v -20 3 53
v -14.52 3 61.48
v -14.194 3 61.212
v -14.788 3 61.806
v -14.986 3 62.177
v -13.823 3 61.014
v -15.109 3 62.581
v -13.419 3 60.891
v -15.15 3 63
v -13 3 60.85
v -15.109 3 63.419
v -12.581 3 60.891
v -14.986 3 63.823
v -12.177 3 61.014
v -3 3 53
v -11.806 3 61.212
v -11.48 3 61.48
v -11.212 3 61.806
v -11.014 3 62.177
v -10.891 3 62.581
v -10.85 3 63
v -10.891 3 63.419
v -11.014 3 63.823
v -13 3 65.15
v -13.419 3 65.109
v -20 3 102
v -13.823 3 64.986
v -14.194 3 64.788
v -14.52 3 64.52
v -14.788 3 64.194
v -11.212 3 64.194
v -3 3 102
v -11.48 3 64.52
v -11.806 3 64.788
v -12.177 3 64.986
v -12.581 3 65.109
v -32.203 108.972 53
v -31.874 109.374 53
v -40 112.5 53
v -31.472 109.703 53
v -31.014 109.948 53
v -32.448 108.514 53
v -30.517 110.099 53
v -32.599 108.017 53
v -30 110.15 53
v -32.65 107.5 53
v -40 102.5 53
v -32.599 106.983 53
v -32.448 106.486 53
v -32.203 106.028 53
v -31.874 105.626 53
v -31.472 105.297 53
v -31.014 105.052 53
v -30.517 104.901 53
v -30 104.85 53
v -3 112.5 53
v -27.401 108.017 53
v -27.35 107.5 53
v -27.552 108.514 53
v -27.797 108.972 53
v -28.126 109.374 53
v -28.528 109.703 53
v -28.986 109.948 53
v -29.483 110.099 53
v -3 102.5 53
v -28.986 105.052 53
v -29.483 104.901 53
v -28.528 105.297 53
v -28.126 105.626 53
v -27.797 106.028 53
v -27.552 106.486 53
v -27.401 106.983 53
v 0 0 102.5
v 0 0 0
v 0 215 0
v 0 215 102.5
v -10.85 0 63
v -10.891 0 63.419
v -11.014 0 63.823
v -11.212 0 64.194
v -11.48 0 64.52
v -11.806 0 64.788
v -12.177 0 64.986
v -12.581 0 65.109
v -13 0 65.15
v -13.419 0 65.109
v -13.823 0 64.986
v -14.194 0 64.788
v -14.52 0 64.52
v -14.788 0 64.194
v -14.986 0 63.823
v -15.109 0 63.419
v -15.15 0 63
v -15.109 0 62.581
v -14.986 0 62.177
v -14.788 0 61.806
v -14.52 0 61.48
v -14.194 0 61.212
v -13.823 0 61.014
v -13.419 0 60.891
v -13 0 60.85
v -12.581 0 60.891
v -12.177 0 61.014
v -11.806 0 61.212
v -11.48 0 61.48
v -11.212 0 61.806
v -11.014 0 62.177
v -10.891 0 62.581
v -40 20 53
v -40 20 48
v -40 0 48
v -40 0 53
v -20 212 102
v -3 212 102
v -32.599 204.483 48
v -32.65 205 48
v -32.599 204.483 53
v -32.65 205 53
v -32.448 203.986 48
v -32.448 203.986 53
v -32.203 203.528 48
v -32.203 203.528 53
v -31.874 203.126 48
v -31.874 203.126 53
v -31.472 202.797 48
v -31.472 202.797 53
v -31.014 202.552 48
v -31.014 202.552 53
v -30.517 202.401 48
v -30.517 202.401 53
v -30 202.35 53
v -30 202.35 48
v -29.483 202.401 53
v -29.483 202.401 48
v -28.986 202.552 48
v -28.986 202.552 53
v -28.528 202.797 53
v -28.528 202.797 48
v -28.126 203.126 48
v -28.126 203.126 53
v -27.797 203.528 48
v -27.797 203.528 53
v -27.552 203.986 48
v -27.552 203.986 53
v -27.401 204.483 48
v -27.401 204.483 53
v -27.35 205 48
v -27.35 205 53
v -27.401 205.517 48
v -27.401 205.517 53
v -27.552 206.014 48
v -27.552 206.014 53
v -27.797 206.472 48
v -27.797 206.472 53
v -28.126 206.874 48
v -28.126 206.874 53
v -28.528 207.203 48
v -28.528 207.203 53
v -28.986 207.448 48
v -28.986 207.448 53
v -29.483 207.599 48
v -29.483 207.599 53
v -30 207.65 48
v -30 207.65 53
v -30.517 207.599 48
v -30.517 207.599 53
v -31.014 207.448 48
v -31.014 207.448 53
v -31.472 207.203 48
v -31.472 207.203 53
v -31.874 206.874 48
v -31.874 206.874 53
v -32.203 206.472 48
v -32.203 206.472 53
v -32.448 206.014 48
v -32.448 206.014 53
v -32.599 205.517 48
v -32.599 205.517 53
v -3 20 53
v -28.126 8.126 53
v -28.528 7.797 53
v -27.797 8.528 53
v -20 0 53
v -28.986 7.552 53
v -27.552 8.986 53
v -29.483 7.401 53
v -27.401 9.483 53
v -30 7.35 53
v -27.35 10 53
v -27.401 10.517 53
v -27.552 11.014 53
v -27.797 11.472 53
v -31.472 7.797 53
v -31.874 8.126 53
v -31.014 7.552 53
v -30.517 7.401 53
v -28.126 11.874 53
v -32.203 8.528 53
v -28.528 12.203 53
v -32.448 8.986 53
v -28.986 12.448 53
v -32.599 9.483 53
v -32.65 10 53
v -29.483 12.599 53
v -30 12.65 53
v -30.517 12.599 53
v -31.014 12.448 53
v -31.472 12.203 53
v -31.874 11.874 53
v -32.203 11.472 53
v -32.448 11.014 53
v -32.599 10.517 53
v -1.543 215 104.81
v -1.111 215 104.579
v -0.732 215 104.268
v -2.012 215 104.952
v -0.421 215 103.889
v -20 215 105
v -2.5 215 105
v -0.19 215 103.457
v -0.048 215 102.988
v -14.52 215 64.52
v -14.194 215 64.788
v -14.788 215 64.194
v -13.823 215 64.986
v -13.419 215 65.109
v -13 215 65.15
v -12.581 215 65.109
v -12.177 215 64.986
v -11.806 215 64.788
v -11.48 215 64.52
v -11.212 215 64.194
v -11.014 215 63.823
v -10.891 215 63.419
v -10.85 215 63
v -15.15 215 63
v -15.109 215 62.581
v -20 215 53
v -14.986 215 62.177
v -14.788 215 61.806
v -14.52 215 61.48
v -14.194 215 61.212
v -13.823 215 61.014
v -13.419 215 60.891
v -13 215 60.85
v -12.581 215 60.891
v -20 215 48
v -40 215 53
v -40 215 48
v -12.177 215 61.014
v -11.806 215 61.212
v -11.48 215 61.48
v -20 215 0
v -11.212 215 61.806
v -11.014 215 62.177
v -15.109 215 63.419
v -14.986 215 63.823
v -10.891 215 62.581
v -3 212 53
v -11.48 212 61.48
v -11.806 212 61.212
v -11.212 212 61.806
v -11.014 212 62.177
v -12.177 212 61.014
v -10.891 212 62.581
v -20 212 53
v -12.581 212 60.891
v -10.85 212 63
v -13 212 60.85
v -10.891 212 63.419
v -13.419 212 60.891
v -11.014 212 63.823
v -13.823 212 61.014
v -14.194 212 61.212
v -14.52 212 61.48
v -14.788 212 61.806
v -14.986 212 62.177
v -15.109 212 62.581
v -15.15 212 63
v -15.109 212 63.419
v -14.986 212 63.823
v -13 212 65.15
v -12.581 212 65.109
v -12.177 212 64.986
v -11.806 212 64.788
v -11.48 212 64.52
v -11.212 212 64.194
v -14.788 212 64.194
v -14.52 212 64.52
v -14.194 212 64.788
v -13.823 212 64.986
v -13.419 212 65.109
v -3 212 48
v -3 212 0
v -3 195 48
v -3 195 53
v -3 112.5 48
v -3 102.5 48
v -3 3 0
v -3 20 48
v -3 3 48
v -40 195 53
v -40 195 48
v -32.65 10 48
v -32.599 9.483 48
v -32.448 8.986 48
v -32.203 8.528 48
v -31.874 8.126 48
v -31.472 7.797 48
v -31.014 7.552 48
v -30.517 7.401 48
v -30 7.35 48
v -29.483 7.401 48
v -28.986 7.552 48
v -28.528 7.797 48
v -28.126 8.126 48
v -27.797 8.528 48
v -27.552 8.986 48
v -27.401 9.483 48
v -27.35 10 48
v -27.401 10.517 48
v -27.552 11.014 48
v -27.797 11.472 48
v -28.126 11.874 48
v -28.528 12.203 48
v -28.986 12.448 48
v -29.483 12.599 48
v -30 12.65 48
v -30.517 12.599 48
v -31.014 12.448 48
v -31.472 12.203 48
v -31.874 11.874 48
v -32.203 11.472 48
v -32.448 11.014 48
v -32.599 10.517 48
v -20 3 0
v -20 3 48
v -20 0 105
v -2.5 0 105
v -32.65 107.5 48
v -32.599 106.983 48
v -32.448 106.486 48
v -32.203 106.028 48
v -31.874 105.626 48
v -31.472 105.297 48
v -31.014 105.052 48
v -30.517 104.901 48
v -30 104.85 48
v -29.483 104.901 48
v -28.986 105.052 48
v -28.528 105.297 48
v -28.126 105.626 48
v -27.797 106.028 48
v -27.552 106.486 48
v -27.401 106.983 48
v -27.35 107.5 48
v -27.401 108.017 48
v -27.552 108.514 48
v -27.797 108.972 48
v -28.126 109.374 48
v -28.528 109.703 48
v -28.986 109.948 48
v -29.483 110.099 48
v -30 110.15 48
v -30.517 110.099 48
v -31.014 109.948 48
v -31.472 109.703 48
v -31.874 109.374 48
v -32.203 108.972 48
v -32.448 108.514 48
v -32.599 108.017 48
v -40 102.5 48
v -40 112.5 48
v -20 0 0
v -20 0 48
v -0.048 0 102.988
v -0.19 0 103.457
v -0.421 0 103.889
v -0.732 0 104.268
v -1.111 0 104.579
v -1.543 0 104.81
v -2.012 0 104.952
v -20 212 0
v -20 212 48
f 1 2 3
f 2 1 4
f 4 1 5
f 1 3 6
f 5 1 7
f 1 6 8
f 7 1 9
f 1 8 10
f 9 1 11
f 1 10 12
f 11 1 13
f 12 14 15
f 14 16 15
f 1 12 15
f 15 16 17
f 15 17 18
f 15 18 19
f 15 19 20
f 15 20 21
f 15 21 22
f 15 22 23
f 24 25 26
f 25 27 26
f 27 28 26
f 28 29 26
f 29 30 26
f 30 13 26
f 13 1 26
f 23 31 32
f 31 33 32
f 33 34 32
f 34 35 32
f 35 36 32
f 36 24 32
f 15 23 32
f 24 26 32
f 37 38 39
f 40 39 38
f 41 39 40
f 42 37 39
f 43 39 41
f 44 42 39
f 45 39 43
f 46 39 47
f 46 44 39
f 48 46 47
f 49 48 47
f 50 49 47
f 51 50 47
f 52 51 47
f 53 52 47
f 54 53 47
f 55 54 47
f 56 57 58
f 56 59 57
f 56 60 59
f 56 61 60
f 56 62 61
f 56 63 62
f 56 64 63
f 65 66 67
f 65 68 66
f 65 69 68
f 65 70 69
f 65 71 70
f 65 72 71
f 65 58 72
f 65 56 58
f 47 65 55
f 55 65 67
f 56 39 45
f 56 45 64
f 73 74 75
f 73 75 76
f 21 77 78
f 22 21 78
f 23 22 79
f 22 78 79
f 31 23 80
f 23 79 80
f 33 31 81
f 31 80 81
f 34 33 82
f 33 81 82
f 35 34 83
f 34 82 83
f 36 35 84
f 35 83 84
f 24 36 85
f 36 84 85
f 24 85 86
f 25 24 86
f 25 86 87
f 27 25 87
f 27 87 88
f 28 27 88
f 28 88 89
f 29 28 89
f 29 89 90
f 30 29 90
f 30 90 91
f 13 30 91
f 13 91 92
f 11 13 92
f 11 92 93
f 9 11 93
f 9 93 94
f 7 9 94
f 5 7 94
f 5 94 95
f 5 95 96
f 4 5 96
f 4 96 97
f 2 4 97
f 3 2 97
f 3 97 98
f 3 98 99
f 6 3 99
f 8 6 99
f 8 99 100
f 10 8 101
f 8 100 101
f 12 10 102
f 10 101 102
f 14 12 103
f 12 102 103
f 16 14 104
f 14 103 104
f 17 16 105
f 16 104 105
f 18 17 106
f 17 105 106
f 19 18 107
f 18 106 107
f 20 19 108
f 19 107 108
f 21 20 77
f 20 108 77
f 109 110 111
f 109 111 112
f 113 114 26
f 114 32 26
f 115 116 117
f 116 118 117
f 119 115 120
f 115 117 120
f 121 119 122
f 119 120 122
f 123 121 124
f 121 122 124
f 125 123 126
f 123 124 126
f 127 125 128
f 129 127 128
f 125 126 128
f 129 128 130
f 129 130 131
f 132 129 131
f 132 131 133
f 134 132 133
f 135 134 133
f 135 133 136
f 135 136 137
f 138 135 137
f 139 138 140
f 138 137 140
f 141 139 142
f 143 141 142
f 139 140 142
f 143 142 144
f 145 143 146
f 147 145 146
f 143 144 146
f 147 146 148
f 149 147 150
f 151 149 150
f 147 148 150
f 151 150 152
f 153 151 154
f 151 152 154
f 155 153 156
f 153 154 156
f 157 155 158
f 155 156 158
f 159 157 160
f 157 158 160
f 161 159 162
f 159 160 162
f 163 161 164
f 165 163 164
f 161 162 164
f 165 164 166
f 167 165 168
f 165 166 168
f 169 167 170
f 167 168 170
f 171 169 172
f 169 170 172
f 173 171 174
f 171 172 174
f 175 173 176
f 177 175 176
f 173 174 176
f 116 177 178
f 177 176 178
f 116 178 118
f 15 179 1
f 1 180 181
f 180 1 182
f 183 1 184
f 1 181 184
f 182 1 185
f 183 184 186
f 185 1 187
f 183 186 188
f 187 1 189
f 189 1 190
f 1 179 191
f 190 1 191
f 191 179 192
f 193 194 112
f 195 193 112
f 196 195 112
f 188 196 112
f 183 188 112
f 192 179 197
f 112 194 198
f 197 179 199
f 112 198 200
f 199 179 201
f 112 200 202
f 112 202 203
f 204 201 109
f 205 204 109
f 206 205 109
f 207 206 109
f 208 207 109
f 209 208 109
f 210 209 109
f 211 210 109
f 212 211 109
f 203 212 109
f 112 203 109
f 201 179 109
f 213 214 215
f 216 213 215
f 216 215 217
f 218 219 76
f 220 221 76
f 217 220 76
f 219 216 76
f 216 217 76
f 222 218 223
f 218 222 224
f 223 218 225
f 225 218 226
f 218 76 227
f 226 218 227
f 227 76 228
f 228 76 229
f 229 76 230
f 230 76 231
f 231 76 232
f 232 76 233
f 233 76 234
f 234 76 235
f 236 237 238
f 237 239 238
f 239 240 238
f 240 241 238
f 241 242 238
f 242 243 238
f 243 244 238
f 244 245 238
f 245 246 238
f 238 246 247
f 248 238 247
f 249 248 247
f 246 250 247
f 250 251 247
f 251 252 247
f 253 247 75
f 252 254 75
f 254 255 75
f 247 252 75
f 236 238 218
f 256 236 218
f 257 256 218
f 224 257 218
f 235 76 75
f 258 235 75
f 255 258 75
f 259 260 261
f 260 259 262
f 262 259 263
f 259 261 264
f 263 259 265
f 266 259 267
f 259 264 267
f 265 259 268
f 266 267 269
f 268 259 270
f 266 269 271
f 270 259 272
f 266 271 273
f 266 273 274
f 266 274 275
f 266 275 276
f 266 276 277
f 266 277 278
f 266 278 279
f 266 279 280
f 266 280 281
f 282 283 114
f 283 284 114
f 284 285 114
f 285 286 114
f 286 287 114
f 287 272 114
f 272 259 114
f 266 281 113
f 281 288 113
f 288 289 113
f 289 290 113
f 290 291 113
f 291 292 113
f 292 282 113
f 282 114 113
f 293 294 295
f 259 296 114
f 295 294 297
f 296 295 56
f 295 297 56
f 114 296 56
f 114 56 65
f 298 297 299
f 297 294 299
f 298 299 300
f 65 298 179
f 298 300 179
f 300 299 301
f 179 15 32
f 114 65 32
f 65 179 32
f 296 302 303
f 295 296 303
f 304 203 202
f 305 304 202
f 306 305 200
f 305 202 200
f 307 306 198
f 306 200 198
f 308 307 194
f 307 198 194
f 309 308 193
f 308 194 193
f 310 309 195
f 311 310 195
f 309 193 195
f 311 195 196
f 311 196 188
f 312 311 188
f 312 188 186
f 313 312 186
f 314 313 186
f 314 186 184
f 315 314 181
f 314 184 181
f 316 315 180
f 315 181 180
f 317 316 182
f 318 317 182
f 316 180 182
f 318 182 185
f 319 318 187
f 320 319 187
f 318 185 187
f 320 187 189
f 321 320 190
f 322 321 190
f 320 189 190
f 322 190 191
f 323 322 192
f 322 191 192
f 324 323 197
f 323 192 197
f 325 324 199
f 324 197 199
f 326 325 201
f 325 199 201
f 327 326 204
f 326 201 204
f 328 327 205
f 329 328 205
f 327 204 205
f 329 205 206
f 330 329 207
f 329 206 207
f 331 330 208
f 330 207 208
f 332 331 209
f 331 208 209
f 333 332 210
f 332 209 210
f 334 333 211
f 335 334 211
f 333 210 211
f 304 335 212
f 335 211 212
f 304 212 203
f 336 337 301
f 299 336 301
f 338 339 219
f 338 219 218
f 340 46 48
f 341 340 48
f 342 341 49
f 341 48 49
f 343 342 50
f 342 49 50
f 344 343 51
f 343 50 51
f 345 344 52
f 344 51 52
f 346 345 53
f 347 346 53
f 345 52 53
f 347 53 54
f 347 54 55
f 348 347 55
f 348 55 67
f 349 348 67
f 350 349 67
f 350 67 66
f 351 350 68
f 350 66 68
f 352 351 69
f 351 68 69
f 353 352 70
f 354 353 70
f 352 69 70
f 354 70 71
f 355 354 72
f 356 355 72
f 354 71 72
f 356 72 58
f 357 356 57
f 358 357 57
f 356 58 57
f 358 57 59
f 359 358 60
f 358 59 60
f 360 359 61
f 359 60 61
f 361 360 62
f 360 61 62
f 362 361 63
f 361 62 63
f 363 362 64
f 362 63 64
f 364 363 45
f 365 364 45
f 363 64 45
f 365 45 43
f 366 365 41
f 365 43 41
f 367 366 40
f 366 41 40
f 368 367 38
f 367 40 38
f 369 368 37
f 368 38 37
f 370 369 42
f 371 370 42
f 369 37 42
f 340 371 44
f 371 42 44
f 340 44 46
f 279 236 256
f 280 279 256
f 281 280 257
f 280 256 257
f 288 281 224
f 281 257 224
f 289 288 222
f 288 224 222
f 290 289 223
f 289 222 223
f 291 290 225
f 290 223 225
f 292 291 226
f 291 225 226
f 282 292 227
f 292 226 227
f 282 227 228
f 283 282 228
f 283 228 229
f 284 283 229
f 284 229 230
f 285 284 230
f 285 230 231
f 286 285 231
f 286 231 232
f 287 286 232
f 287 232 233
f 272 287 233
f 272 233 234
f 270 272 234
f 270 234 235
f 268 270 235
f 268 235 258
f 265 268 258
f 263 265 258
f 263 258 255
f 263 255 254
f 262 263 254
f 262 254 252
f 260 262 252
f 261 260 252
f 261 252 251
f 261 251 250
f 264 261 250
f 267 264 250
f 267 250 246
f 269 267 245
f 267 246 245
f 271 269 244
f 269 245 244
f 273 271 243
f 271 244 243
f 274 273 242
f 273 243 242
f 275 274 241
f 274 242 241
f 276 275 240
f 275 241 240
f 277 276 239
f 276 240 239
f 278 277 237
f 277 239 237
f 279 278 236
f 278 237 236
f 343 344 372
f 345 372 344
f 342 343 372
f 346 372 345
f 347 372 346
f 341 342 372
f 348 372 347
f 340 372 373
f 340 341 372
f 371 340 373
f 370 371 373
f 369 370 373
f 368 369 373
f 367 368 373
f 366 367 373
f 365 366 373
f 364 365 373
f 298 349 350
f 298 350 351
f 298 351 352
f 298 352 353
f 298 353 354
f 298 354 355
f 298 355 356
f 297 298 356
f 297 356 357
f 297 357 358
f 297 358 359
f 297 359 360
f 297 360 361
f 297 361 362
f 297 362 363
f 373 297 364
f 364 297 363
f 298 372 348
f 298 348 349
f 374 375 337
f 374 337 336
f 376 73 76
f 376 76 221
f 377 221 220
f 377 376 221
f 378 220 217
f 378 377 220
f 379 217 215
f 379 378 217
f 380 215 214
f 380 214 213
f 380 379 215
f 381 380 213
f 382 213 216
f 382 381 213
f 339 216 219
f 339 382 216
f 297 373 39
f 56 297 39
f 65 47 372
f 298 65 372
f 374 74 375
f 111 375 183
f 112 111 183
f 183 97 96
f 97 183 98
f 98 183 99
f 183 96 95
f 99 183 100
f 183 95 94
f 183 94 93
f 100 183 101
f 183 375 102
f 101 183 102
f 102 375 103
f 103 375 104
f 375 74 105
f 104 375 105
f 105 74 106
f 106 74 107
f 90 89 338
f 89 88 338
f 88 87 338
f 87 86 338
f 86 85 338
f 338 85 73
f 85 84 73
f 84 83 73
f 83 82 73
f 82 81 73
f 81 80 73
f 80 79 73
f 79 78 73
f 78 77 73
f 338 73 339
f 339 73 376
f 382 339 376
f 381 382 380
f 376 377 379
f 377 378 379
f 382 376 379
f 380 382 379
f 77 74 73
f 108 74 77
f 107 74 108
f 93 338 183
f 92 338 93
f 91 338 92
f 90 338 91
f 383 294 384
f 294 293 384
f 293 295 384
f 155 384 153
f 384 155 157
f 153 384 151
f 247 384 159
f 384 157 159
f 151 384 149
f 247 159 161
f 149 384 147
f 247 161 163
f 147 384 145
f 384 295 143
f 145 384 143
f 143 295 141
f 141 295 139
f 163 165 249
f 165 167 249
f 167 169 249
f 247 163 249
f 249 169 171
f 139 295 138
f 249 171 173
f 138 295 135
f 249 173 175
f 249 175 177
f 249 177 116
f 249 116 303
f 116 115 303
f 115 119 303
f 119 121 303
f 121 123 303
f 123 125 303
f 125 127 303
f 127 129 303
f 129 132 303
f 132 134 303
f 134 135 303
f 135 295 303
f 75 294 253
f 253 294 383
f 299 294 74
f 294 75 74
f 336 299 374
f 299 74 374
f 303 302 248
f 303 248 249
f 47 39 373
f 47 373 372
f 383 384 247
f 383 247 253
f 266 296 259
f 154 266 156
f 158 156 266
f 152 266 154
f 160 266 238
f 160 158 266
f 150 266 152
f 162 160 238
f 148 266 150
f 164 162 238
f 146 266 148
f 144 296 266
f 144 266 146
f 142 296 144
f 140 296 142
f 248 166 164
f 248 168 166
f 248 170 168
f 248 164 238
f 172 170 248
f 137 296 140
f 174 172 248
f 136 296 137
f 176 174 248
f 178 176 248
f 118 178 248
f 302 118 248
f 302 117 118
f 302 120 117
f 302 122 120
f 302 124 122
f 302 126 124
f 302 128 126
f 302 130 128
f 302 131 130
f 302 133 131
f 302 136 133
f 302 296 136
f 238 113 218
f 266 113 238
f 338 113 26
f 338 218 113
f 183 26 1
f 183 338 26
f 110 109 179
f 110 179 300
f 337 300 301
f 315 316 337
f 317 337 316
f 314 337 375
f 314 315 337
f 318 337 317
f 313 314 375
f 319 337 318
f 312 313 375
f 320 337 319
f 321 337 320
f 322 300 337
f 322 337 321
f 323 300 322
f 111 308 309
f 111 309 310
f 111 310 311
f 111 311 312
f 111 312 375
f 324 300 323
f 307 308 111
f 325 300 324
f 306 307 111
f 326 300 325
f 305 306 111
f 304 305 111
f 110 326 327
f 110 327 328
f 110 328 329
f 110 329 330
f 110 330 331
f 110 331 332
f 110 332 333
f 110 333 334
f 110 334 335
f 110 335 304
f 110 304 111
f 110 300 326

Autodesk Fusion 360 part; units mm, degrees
sketch "스케치1" plane through (0, 0, 0) normal (0, 1, 0) x (1, 0, 0)
  line L0 (0, 0) -> (0, -105)
  line L1 (0, 0) -> (-3, 0)
  line L2 (-3, 0) -> (-3, -102)
  line L3 (-3, -102) -> (-20, -102)
  line L4 (0, -105) -> (-20, -105)
  line L5 (-20, -105) -> (-20, -102)
  dimension "d1" = 105
  dimension "d2" = 3
  dimension "d3" = 102
  dimension "d4" = 17
extrude "돌출1" add sketch "스케치1" along normal blind 215
sketch "스케치2" plane through (0, 0, 0) normal (0, -1, 0) x (1, 0, 0)
  line L0 (-3, 0) -> (0, 0)
  line L1 (0, 0) -> (0, 105)
  line L2 (0, 105) -> (-20, 105)
  line L3 (-20, 105) -> (-20, 102)
  line L4 (-20, 102) -> (-3, 102)
  line L5 (-3, 102) -> (-3, 0)
  line L6 (0, 105) -> (-20, 105)
  line L7 (-20, 105) -> (-20, 0)
  line L8 (-20, 0) -> (0, 0)
  line L9 (0, 0) -> (0, 105)
  line L10 (-3, 102) -> (-3, 73)
  line L11 (-3, 73) -> (-20, 73)
  line L12 (-20, 73) -> (-20, 53)
  line L13 (-20, 53) -> (-3, 53)
  line L14 (-3, 53) -> (-3, 73)
  line L15 (-20, 53) -> (-13, 53)
  line L16 (-13, 53) -> (-13, 63)
  line L17 (-13, 63) -> (-20, 63)
  line L18 (-20, 63) -> (-20, 53)
  circle A0 centre (-13, 63) radius 2.15
  dimension "d11" = 29
  dimension "d12" = 17
  dimension "d13" = 20
  dimension "d14" = 7
  dimension "d15" = 10
  dimension "d16" = 4.3
extrude "돌출2" add sketch "스케치2" against normal blind 3 contours L0 L1 L2 L3 L4 L5 L6 L7 L8 L9 L10 L14 | L5 L7 L8 L13 L15 | L5 L7 L11 L12 L13 L14 L16 L17 A0 | L4 L5 L7 L10 L11 | L7 L12 L13 L15 L16 L17 L18 A0
sketch "스케치3" plane through (0, 215, 0) normal (0, 1, 0) x (-1, 0, 0)
  line L0 (0, 0) -> (3, 0)
  line L1 (3, 0) -> (3, 102)
  line L2 (3, 102) -> (20, 102)
  line L3 (20, 102) -> (20, 105)
  line L4 (20, 105) -> (0, 105)
  line L5 (0, 105) -> (0, 0)
  line L6 (0, 105) -> (20, 105)
  line L7 (20, 105) -> (20, 0)
  line L8 (20, 0) -> (0, 0)
  line L9 (0, 0) -> (0, 105)
  line L10 (3, 102) -> (3, 73)
  line L11 (3, 73) -> (20, 73)
  line L12 (20, 73) -> (20, 53)
  line L13 (20, 53) -> (3, 53)
  line L14 (3, 53) -> (3, 73)
  line L15 (20, 53) -> (13, 53)
  line L16 (13, 53) -> (13, 63)
  line L17 (13, 63) -> (20, 63)
  line L18 (20, 63) -> (20, 53)
  circle A0 centre (13, 63) radius 2.15
  dimension "d17" = 29
  dimension "d18" = 17
  dimension "d19" = 20
  dimension "d20" = 7
  dimension "d21" = 10
  dimension "d22" = 4.3
extrude "돌출3" add sketch "스케치3" against normal blind 3 contours L1 L7 L8 L13 L15 | L1 L7 L11 L12 L13 L14 L16 L17 A0 | L1 L2 L7 L10 L11 | L7 L12 L13 L15 L16 L17 L18 A0
sketch "스케치4" plane through (-3, 0, 0) normal (-1, 0, 0) x (0, -1, 0)
  line L0 (-212, 102) -> (-212, 0)
  line L1 (-212, 0) -> (-3, 0)
  line L2 (-3, 0) -> (-3, 102)
  line L3 (-3, 102) -> (-212, 102)
  line L4 (-212, 102) -> (-212, 53)
  line L5 (-212, 53) -> (-195, 53)
  line L6 (-195, 53) -> (-195, 48)
  line L7 (-195, 48) -> (-212, 48)
  line L8 (-212, 48) -> (-212, 53)
  line L9 (-3, 53) -> (-20, 53)
  line L10 (-20, 53) -> (-20, 48)
  line L11 (-20, 48) -> (-3, 48)
  line L12 (-3, 48) -> (-3, 53)
  line L13 (-195, 53) -> (-112.5, 53)
  line L14 (-112.5, 53) -> (-102.5, 53)
  line L15 (-102.5, 53) -> (-102.5, 48)
  line L16 (-102.5, 48) -> (-112.5, 48)
  line L17 (-112.5, 48) -> (-112.5, 53)
  dimension "d23" = 49
  dimension "d24" = 17
  dimension "d25" = 5
  dimension "d26" = 17
  dimension "d27" = 5
  dimension "d28" = 82.5
  dimension "d29" = 10
  dimension "d30" = 5
extrude "돌출4" add sketch "스케치4" along normal blind 37 contours L14 L15 L16 L17 | L0 L5 L6 L7 L8 | L2 L9 L10 L11 L12
extrude "돌출5" add 1 faces at (-26.6667, 3, 49.6667) along direction (0, -1, 0) blind 3
extrude "돌출6" add 1 faces at (-33.3333, 212, 51.3333) along direction (0, 1, 0) blind 3
sketch "스케치5" plane through (0, 0, 53) normal (0, 0, 1) x (-1, 0, 0)
  line L0 (3, -102.5) -> (3, -112.5)
  line L1 (3, -112.5) -> (40, -112.5)
  line L2 (40, -112.5) -> (40, -102.5)
  line L3 (40, -102.5) -> (3, -102.5)
  line L4 (40, -102.5) -> (20, -102.5)
  line L5 (20, -102.5) -> (20, -112.5)
  line L6 (20, -112.5) -> (40, -112.5)
  line L7 (40, -112.5) -> (40, -102.5)
  circle A0 centre (30, -107.5) radius 2.65
  circle A1 centre (30, -205) radius 2.65
  circle A2 centre (30, -10) radius 2.65
  dimension "d37" = 20
  dimension "d43" = 5.3
  dimension "d49" = 5.3
  dimension "d50" = 5.3
extrude "돌출7" cut sketch "스케치5" against normal blind 5 contours A0 | A1 | A2
fillet "필렛1" radius 2.5 1 edges at (0, 107.5, 105)
